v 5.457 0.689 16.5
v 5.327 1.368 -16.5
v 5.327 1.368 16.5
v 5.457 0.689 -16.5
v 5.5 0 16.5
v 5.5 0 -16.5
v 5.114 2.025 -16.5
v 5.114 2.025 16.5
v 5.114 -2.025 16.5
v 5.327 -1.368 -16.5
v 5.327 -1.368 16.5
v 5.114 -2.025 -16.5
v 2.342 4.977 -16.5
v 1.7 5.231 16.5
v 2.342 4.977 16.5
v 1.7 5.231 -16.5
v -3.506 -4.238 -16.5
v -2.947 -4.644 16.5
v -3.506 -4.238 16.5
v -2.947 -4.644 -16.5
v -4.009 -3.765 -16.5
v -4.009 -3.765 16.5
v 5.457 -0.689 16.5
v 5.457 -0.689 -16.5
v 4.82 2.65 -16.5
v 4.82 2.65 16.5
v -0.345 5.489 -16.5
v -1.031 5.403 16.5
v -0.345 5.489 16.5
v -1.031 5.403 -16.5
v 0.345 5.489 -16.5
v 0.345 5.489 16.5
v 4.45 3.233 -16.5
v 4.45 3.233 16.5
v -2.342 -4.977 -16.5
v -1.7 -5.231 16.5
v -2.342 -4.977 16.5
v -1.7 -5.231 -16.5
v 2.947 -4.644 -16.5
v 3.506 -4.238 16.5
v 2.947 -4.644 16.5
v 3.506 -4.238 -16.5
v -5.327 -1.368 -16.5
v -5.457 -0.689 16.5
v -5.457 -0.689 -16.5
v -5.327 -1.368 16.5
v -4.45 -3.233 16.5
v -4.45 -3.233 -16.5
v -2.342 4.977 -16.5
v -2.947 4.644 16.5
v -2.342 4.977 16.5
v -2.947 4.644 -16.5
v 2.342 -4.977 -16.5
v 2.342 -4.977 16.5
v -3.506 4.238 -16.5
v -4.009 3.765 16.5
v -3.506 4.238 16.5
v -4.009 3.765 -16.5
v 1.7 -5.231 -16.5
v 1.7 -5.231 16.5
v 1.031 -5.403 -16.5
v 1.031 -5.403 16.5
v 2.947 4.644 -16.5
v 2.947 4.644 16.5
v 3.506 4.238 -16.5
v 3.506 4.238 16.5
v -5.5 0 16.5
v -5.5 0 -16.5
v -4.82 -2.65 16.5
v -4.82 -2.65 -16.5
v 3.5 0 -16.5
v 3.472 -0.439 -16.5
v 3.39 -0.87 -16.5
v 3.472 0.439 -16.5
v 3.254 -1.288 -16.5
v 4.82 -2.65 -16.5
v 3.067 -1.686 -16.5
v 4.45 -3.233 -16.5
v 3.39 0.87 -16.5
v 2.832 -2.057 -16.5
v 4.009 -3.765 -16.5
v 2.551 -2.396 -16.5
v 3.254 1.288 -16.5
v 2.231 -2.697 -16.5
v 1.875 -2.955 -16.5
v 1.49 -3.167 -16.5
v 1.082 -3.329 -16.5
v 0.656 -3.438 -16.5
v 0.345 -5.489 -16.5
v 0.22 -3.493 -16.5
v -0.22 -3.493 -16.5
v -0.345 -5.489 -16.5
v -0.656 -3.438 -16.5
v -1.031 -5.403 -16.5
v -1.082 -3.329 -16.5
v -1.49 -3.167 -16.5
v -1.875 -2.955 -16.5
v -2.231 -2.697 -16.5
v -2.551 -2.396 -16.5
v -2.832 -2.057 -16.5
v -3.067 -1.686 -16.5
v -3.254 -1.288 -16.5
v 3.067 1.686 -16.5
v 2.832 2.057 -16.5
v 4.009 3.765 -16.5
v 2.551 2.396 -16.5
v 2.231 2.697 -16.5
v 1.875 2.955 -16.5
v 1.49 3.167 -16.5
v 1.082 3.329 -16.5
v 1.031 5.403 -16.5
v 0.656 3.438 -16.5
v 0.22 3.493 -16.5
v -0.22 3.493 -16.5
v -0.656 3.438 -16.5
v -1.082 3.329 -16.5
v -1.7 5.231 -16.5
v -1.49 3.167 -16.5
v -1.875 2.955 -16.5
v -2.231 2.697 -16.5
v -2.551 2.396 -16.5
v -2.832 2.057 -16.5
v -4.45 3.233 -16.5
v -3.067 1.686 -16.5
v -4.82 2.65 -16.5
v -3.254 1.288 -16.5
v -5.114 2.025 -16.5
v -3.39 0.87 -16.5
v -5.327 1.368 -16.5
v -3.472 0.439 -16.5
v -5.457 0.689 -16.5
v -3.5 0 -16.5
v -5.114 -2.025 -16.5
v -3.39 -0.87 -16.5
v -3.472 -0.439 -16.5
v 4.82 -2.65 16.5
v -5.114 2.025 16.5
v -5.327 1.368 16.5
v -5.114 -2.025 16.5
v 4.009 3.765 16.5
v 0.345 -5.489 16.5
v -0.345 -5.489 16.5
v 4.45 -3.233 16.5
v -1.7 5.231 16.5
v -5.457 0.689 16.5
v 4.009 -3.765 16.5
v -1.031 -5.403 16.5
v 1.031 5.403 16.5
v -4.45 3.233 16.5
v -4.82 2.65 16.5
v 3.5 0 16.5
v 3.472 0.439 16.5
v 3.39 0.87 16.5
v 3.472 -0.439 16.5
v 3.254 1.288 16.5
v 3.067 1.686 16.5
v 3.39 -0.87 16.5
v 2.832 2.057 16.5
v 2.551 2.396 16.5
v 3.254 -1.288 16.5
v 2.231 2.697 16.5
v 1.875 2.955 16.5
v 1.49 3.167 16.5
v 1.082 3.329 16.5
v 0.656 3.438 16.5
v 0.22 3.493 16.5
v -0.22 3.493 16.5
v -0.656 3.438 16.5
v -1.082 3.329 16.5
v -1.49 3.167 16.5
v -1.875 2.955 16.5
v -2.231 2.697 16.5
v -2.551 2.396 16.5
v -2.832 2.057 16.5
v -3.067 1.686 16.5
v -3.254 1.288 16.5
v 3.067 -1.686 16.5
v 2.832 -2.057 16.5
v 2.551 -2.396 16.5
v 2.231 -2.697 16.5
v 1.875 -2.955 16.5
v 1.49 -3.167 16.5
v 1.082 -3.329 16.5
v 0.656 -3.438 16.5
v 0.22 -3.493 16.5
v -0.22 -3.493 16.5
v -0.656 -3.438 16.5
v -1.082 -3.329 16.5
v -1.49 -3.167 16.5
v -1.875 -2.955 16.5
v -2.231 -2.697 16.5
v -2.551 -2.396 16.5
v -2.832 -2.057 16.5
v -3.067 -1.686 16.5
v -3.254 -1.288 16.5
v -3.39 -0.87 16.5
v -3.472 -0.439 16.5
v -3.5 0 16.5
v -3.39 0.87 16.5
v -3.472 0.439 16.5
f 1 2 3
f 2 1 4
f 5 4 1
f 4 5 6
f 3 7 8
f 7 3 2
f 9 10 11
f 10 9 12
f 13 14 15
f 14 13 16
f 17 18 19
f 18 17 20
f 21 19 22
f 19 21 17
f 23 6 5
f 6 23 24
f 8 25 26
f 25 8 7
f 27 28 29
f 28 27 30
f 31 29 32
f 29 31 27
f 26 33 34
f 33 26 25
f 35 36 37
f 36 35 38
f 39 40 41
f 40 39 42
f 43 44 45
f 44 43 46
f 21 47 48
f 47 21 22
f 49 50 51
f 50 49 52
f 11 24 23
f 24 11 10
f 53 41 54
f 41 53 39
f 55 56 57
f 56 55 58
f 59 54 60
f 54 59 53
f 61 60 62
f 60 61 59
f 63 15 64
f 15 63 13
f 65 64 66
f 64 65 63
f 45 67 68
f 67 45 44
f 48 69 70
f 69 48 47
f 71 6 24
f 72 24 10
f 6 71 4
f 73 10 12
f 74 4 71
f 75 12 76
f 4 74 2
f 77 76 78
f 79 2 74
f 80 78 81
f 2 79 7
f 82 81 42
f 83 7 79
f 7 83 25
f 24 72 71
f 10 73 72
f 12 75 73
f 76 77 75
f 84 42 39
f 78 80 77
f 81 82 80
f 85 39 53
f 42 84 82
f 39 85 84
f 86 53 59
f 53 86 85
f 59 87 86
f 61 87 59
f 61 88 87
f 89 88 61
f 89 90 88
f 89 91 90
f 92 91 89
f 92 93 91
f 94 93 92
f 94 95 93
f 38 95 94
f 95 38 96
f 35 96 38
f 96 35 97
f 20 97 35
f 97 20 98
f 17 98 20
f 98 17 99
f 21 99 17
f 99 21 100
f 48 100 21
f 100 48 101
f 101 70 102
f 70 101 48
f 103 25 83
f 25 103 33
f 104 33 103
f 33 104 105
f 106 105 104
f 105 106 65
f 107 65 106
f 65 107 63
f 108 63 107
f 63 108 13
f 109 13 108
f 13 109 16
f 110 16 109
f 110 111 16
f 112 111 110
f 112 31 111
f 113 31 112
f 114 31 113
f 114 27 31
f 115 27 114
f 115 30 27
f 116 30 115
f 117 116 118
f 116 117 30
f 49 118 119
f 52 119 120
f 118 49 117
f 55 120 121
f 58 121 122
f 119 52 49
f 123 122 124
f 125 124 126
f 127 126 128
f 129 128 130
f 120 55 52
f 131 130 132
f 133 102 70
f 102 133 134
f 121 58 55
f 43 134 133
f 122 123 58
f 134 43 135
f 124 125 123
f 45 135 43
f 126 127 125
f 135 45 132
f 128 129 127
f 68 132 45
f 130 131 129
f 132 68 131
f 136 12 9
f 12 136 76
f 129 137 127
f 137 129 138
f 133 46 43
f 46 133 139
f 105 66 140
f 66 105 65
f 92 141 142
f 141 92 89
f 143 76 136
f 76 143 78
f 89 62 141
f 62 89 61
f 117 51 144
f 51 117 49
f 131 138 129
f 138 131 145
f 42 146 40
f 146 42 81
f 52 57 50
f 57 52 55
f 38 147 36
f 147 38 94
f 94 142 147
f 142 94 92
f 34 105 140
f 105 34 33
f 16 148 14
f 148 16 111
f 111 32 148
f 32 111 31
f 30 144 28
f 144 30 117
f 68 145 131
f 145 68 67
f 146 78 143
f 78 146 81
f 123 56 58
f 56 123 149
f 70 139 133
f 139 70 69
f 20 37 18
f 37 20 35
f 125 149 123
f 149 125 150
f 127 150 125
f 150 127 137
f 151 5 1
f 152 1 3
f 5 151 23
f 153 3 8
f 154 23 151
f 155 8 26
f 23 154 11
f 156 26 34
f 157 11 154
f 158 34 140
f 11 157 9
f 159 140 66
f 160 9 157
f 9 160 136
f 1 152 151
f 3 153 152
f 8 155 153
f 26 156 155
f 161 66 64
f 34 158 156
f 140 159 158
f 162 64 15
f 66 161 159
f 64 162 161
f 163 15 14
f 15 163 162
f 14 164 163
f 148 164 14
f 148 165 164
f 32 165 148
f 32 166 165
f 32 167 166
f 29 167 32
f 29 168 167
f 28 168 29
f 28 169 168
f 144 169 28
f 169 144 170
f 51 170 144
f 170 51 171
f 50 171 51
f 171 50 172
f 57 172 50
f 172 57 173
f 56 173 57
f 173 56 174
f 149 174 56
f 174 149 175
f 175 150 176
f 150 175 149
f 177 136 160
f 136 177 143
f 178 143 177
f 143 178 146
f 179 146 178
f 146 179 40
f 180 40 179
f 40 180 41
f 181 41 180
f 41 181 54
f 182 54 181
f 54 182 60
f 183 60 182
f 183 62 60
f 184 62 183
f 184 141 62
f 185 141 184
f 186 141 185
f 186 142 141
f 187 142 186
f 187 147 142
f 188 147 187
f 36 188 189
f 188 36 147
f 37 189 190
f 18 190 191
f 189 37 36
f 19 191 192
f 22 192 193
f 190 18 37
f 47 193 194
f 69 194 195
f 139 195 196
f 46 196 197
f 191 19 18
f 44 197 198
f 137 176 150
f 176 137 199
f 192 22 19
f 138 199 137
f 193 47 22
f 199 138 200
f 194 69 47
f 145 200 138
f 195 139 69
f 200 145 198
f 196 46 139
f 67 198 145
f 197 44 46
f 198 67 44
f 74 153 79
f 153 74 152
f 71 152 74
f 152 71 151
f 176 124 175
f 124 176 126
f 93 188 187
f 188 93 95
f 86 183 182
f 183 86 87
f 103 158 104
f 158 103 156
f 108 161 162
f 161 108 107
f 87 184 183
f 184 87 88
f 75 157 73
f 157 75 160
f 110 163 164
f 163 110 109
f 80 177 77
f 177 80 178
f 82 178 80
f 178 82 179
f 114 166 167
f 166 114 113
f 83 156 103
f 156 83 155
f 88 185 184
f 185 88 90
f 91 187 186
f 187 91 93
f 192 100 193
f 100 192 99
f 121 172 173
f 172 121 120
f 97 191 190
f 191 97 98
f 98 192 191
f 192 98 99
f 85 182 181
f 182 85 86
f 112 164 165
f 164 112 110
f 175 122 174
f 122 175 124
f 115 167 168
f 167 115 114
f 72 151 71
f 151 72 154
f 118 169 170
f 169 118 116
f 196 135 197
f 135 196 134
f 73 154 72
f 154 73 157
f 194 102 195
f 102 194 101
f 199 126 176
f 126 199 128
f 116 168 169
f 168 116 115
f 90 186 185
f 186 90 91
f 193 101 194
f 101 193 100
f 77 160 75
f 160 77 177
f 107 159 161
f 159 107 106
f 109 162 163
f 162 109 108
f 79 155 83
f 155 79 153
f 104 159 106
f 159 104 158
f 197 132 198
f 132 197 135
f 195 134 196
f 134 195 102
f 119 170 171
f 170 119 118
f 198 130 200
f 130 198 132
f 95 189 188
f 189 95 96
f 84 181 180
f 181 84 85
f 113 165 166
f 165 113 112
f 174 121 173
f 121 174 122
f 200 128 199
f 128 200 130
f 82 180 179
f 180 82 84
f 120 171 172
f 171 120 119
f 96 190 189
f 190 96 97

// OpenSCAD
$fn = 50;


difference() {
	union() {
		translate(v = [0, 0, -16.5000000000]) {
			cylinder(h = 33, r = 5.5000000000);
		}
	}
	union() {
		translate(v = [0, 0, -100.0000000000]) {
			cylinder(h = 200, r = 3.5000000000);
		}
	}
}
